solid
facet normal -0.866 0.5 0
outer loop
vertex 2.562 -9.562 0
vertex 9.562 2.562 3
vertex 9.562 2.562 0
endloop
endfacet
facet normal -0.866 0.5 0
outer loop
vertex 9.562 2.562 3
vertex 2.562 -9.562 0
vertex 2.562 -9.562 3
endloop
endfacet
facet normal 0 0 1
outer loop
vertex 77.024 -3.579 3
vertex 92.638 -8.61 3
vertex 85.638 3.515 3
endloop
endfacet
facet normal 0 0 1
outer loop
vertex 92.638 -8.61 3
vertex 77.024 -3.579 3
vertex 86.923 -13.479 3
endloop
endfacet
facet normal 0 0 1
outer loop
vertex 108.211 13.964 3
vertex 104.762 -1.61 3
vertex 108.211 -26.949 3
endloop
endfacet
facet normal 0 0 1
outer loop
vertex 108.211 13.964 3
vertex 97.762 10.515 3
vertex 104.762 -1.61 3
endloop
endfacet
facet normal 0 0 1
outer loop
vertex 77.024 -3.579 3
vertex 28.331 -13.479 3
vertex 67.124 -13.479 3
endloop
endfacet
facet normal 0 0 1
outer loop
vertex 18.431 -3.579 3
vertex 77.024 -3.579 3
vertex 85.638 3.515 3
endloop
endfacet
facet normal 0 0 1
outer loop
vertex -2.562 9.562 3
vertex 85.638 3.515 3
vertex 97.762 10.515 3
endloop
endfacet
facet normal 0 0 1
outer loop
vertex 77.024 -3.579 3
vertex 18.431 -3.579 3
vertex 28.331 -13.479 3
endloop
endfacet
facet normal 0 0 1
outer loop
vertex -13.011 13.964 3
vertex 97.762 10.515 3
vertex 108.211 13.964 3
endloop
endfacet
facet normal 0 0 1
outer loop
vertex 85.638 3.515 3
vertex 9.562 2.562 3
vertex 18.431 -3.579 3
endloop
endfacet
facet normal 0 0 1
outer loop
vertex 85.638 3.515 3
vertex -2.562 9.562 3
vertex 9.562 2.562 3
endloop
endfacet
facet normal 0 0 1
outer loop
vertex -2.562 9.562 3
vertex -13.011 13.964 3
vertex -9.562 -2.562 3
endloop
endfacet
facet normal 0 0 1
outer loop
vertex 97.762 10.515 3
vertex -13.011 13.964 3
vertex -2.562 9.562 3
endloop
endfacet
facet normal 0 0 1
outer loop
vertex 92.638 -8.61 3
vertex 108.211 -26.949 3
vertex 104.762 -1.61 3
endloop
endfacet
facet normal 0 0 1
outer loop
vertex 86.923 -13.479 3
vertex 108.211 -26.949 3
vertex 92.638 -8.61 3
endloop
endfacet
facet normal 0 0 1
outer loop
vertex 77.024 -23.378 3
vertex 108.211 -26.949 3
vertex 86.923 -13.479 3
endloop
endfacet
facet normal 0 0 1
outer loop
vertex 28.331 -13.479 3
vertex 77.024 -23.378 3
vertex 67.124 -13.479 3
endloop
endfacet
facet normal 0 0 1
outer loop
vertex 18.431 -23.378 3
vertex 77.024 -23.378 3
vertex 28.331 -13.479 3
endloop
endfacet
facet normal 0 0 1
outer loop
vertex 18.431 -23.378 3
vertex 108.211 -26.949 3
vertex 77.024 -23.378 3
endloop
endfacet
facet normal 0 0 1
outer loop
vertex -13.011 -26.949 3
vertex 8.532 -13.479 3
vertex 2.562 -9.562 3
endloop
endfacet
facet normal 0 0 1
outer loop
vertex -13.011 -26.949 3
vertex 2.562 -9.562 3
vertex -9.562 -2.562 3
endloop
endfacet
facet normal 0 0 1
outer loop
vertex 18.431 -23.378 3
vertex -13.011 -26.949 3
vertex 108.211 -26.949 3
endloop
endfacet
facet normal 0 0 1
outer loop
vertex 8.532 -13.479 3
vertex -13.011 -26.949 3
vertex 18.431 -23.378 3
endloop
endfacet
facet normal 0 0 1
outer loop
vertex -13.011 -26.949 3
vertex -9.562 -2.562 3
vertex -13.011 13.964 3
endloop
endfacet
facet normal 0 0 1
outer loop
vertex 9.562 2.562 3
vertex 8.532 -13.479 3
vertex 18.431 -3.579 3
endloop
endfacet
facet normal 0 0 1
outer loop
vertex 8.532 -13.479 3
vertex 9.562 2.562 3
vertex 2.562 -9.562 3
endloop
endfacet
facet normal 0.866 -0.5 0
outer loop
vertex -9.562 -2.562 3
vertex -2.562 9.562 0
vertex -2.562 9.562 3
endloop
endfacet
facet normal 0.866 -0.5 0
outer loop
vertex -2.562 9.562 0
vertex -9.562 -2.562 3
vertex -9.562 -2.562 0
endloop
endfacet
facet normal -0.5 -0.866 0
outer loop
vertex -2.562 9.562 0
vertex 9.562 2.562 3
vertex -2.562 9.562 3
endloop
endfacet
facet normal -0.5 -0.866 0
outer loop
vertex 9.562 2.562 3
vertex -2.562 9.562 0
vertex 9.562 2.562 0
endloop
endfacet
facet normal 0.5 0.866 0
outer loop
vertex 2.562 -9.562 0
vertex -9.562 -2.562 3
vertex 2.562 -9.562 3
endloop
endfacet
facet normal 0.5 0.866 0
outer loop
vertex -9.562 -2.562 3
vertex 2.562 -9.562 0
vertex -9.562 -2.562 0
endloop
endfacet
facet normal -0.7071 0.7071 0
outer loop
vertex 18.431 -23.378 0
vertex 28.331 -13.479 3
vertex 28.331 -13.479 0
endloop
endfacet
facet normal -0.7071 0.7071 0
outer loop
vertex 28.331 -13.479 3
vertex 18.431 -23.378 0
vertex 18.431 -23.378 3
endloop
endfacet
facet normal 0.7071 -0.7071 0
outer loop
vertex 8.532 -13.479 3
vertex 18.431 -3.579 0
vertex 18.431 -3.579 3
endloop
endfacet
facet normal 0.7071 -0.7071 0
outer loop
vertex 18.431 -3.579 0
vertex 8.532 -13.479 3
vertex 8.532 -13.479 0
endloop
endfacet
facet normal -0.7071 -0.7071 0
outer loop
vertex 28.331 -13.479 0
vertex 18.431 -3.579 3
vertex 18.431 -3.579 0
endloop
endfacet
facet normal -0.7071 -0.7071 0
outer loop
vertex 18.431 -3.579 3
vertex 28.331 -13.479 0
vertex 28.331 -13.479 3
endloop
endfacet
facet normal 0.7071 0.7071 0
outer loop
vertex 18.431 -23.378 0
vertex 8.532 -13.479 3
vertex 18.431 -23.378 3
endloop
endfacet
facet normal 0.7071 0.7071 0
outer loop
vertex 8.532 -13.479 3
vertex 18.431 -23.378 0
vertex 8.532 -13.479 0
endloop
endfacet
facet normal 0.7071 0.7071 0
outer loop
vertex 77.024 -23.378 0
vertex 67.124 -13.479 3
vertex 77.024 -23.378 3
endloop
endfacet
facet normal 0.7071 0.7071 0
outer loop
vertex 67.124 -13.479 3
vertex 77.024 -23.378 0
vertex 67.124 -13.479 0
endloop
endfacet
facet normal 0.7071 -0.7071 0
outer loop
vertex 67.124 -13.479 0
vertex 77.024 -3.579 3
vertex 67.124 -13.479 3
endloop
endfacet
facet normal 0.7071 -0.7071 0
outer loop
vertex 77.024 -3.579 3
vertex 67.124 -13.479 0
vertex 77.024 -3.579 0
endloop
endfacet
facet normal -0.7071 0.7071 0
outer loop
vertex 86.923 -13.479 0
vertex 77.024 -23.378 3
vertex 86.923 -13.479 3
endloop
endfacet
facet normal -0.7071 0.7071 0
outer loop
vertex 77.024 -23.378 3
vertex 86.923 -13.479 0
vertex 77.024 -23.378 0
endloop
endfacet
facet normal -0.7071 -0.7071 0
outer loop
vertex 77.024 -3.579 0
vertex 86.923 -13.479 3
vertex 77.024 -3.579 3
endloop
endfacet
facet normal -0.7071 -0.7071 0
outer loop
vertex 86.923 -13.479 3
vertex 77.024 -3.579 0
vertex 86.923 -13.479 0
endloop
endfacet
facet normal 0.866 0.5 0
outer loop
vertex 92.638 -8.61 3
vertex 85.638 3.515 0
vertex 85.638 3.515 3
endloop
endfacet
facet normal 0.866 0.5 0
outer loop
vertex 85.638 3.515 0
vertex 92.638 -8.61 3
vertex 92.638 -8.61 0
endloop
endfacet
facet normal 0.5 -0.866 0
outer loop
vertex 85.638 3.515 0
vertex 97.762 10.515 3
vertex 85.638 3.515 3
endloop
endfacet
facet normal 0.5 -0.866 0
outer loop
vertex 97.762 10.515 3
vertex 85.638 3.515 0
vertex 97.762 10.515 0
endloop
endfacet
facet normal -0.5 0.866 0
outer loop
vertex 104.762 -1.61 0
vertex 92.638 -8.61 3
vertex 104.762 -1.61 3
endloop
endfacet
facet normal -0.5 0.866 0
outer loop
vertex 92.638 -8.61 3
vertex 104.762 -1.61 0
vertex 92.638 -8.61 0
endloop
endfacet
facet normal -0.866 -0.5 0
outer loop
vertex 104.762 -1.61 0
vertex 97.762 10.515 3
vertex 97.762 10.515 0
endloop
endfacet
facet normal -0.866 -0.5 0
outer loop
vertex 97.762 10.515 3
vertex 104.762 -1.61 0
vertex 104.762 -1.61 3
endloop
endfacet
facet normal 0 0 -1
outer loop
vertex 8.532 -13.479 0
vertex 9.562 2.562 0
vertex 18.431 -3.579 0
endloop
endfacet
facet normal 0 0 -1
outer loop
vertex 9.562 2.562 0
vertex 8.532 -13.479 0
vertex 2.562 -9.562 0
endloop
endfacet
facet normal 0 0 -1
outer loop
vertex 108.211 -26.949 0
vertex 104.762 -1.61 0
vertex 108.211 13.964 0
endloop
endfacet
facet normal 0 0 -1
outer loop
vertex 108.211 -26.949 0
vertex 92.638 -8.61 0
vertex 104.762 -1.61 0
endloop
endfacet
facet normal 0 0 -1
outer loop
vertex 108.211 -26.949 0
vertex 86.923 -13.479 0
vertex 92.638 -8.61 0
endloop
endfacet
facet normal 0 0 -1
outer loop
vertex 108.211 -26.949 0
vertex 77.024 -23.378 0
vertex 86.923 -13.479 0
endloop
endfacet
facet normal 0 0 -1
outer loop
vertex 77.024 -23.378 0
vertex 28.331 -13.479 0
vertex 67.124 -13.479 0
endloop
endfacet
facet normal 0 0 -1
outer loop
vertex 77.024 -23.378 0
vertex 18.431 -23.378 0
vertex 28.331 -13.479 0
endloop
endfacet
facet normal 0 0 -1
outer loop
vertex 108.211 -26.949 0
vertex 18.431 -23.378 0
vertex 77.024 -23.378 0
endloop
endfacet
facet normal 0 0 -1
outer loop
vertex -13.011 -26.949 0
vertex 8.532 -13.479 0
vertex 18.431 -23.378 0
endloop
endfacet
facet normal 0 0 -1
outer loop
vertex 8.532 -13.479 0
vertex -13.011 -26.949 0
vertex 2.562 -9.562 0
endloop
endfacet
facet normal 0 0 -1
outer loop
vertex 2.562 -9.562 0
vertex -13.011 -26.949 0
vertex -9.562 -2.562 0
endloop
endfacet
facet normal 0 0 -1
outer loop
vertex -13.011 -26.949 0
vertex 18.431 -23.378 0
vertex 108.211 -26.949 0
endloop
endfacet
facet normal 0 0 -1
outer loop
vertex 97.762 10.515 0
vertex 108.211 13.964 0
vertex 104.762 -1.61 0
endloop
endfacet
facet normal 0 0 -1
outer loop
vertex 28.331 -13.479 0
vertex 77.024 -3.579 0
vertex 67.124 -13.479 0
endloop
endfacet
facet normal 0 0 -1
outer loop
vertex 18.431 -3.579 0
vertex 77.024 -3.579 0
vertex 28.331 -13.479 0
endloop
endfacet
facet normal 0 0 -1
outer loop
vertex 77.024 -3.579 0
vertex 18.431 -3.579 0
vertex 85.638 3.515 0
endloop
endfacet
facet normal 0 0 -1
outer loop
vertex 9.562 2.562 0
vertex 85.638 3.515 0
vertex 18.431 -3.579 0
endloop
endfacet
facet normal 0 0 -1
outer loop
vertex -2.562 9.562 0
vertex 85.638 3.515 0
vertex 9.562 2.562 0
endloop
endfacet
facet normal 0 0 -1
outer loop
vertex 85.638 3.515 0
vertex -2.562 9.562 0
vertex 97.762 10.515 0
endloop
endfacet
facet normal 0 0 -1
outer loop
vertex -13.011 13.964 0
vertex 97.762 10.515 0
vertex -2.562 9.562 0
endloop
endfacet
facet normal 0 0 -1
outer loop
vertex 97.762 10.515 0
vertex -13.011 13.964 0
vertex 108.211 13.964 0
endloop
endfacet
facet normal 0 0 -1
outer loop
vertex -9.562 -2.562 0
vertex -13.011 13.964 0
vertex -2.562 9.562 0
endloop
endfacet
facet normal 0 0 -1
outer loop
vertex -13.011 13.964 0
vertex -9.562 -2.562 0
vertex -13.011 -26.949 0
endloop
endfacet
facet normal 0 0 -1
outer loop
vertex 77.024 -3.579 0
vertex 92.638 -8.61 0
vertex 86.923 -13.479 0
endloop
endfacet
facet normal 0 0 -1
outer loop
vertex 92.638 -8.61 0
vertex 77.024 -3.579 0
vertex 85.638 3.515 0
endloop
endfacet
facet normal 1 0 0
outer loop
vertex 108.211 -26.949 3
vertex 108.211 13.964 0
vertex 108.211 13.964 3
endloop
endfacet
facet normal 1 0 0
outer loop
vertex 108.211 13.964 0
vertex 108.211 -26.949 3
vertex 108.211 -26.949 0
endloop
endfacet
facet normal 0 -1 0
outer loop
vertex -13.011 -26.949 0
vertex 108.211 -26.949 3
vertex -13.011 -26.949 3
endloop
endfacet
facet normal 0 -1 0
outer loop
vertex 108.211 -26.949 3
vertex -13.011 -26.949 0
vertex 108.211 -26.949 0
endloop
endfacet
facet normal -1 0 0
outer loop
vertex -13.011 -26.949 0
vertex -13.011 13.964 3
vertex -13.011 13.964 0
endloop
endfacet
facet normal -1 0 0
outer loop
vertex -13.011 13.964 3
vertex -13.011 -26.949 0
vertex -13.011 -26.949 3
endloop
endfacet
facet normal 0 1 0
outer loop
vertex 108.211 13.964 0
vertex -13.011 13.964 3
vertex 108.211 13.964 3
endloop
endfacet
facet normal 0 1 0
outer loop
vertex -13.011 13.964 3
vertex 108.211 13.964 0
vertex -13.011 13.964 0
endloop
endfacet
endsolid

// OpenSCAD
$fn = $preview ? 0 : 100;


difference(){
	difference() {
		union() {
			linear_extrude(height = 3) {
				polygon(points = [[-13.01139197104675, -26.9492360742766], [108.21132963474386, -26.9492360742766], [108.21132963474386, 13.963891971046747], [-13.01139197104675, 13.963891971046747], [-13.01139197104675, -26.9492360742766]]);
			}
		}
	}
	/* Holes Below*/
	union(){
		translate(v = [0.0000000000, -0.0000000000, 0]) {
			rotate(a = -30) {
				cube(center = true, size = [14, 14, 6]);
			}
		}
		translate(v = [18.4311948892, -13.4788518927, 0]) {
			rotate(a = -45) {
				cube(center = true, size = [14, 14, 6]);
			}
		}
		translate(v = [77.0239643803, -13.4788518927, 0]) {
			rotate(a = 45) {
				cube(center = true, size = [14, 14, 6]);
			}
		}
		translate(v = [95.1999376637, 0.9525000000, 0]) {
			rotate(a = 30) {
				cube(center = true, size = [14, 14, 6]);
			}
		}
	} /* End Holes */ 
}
